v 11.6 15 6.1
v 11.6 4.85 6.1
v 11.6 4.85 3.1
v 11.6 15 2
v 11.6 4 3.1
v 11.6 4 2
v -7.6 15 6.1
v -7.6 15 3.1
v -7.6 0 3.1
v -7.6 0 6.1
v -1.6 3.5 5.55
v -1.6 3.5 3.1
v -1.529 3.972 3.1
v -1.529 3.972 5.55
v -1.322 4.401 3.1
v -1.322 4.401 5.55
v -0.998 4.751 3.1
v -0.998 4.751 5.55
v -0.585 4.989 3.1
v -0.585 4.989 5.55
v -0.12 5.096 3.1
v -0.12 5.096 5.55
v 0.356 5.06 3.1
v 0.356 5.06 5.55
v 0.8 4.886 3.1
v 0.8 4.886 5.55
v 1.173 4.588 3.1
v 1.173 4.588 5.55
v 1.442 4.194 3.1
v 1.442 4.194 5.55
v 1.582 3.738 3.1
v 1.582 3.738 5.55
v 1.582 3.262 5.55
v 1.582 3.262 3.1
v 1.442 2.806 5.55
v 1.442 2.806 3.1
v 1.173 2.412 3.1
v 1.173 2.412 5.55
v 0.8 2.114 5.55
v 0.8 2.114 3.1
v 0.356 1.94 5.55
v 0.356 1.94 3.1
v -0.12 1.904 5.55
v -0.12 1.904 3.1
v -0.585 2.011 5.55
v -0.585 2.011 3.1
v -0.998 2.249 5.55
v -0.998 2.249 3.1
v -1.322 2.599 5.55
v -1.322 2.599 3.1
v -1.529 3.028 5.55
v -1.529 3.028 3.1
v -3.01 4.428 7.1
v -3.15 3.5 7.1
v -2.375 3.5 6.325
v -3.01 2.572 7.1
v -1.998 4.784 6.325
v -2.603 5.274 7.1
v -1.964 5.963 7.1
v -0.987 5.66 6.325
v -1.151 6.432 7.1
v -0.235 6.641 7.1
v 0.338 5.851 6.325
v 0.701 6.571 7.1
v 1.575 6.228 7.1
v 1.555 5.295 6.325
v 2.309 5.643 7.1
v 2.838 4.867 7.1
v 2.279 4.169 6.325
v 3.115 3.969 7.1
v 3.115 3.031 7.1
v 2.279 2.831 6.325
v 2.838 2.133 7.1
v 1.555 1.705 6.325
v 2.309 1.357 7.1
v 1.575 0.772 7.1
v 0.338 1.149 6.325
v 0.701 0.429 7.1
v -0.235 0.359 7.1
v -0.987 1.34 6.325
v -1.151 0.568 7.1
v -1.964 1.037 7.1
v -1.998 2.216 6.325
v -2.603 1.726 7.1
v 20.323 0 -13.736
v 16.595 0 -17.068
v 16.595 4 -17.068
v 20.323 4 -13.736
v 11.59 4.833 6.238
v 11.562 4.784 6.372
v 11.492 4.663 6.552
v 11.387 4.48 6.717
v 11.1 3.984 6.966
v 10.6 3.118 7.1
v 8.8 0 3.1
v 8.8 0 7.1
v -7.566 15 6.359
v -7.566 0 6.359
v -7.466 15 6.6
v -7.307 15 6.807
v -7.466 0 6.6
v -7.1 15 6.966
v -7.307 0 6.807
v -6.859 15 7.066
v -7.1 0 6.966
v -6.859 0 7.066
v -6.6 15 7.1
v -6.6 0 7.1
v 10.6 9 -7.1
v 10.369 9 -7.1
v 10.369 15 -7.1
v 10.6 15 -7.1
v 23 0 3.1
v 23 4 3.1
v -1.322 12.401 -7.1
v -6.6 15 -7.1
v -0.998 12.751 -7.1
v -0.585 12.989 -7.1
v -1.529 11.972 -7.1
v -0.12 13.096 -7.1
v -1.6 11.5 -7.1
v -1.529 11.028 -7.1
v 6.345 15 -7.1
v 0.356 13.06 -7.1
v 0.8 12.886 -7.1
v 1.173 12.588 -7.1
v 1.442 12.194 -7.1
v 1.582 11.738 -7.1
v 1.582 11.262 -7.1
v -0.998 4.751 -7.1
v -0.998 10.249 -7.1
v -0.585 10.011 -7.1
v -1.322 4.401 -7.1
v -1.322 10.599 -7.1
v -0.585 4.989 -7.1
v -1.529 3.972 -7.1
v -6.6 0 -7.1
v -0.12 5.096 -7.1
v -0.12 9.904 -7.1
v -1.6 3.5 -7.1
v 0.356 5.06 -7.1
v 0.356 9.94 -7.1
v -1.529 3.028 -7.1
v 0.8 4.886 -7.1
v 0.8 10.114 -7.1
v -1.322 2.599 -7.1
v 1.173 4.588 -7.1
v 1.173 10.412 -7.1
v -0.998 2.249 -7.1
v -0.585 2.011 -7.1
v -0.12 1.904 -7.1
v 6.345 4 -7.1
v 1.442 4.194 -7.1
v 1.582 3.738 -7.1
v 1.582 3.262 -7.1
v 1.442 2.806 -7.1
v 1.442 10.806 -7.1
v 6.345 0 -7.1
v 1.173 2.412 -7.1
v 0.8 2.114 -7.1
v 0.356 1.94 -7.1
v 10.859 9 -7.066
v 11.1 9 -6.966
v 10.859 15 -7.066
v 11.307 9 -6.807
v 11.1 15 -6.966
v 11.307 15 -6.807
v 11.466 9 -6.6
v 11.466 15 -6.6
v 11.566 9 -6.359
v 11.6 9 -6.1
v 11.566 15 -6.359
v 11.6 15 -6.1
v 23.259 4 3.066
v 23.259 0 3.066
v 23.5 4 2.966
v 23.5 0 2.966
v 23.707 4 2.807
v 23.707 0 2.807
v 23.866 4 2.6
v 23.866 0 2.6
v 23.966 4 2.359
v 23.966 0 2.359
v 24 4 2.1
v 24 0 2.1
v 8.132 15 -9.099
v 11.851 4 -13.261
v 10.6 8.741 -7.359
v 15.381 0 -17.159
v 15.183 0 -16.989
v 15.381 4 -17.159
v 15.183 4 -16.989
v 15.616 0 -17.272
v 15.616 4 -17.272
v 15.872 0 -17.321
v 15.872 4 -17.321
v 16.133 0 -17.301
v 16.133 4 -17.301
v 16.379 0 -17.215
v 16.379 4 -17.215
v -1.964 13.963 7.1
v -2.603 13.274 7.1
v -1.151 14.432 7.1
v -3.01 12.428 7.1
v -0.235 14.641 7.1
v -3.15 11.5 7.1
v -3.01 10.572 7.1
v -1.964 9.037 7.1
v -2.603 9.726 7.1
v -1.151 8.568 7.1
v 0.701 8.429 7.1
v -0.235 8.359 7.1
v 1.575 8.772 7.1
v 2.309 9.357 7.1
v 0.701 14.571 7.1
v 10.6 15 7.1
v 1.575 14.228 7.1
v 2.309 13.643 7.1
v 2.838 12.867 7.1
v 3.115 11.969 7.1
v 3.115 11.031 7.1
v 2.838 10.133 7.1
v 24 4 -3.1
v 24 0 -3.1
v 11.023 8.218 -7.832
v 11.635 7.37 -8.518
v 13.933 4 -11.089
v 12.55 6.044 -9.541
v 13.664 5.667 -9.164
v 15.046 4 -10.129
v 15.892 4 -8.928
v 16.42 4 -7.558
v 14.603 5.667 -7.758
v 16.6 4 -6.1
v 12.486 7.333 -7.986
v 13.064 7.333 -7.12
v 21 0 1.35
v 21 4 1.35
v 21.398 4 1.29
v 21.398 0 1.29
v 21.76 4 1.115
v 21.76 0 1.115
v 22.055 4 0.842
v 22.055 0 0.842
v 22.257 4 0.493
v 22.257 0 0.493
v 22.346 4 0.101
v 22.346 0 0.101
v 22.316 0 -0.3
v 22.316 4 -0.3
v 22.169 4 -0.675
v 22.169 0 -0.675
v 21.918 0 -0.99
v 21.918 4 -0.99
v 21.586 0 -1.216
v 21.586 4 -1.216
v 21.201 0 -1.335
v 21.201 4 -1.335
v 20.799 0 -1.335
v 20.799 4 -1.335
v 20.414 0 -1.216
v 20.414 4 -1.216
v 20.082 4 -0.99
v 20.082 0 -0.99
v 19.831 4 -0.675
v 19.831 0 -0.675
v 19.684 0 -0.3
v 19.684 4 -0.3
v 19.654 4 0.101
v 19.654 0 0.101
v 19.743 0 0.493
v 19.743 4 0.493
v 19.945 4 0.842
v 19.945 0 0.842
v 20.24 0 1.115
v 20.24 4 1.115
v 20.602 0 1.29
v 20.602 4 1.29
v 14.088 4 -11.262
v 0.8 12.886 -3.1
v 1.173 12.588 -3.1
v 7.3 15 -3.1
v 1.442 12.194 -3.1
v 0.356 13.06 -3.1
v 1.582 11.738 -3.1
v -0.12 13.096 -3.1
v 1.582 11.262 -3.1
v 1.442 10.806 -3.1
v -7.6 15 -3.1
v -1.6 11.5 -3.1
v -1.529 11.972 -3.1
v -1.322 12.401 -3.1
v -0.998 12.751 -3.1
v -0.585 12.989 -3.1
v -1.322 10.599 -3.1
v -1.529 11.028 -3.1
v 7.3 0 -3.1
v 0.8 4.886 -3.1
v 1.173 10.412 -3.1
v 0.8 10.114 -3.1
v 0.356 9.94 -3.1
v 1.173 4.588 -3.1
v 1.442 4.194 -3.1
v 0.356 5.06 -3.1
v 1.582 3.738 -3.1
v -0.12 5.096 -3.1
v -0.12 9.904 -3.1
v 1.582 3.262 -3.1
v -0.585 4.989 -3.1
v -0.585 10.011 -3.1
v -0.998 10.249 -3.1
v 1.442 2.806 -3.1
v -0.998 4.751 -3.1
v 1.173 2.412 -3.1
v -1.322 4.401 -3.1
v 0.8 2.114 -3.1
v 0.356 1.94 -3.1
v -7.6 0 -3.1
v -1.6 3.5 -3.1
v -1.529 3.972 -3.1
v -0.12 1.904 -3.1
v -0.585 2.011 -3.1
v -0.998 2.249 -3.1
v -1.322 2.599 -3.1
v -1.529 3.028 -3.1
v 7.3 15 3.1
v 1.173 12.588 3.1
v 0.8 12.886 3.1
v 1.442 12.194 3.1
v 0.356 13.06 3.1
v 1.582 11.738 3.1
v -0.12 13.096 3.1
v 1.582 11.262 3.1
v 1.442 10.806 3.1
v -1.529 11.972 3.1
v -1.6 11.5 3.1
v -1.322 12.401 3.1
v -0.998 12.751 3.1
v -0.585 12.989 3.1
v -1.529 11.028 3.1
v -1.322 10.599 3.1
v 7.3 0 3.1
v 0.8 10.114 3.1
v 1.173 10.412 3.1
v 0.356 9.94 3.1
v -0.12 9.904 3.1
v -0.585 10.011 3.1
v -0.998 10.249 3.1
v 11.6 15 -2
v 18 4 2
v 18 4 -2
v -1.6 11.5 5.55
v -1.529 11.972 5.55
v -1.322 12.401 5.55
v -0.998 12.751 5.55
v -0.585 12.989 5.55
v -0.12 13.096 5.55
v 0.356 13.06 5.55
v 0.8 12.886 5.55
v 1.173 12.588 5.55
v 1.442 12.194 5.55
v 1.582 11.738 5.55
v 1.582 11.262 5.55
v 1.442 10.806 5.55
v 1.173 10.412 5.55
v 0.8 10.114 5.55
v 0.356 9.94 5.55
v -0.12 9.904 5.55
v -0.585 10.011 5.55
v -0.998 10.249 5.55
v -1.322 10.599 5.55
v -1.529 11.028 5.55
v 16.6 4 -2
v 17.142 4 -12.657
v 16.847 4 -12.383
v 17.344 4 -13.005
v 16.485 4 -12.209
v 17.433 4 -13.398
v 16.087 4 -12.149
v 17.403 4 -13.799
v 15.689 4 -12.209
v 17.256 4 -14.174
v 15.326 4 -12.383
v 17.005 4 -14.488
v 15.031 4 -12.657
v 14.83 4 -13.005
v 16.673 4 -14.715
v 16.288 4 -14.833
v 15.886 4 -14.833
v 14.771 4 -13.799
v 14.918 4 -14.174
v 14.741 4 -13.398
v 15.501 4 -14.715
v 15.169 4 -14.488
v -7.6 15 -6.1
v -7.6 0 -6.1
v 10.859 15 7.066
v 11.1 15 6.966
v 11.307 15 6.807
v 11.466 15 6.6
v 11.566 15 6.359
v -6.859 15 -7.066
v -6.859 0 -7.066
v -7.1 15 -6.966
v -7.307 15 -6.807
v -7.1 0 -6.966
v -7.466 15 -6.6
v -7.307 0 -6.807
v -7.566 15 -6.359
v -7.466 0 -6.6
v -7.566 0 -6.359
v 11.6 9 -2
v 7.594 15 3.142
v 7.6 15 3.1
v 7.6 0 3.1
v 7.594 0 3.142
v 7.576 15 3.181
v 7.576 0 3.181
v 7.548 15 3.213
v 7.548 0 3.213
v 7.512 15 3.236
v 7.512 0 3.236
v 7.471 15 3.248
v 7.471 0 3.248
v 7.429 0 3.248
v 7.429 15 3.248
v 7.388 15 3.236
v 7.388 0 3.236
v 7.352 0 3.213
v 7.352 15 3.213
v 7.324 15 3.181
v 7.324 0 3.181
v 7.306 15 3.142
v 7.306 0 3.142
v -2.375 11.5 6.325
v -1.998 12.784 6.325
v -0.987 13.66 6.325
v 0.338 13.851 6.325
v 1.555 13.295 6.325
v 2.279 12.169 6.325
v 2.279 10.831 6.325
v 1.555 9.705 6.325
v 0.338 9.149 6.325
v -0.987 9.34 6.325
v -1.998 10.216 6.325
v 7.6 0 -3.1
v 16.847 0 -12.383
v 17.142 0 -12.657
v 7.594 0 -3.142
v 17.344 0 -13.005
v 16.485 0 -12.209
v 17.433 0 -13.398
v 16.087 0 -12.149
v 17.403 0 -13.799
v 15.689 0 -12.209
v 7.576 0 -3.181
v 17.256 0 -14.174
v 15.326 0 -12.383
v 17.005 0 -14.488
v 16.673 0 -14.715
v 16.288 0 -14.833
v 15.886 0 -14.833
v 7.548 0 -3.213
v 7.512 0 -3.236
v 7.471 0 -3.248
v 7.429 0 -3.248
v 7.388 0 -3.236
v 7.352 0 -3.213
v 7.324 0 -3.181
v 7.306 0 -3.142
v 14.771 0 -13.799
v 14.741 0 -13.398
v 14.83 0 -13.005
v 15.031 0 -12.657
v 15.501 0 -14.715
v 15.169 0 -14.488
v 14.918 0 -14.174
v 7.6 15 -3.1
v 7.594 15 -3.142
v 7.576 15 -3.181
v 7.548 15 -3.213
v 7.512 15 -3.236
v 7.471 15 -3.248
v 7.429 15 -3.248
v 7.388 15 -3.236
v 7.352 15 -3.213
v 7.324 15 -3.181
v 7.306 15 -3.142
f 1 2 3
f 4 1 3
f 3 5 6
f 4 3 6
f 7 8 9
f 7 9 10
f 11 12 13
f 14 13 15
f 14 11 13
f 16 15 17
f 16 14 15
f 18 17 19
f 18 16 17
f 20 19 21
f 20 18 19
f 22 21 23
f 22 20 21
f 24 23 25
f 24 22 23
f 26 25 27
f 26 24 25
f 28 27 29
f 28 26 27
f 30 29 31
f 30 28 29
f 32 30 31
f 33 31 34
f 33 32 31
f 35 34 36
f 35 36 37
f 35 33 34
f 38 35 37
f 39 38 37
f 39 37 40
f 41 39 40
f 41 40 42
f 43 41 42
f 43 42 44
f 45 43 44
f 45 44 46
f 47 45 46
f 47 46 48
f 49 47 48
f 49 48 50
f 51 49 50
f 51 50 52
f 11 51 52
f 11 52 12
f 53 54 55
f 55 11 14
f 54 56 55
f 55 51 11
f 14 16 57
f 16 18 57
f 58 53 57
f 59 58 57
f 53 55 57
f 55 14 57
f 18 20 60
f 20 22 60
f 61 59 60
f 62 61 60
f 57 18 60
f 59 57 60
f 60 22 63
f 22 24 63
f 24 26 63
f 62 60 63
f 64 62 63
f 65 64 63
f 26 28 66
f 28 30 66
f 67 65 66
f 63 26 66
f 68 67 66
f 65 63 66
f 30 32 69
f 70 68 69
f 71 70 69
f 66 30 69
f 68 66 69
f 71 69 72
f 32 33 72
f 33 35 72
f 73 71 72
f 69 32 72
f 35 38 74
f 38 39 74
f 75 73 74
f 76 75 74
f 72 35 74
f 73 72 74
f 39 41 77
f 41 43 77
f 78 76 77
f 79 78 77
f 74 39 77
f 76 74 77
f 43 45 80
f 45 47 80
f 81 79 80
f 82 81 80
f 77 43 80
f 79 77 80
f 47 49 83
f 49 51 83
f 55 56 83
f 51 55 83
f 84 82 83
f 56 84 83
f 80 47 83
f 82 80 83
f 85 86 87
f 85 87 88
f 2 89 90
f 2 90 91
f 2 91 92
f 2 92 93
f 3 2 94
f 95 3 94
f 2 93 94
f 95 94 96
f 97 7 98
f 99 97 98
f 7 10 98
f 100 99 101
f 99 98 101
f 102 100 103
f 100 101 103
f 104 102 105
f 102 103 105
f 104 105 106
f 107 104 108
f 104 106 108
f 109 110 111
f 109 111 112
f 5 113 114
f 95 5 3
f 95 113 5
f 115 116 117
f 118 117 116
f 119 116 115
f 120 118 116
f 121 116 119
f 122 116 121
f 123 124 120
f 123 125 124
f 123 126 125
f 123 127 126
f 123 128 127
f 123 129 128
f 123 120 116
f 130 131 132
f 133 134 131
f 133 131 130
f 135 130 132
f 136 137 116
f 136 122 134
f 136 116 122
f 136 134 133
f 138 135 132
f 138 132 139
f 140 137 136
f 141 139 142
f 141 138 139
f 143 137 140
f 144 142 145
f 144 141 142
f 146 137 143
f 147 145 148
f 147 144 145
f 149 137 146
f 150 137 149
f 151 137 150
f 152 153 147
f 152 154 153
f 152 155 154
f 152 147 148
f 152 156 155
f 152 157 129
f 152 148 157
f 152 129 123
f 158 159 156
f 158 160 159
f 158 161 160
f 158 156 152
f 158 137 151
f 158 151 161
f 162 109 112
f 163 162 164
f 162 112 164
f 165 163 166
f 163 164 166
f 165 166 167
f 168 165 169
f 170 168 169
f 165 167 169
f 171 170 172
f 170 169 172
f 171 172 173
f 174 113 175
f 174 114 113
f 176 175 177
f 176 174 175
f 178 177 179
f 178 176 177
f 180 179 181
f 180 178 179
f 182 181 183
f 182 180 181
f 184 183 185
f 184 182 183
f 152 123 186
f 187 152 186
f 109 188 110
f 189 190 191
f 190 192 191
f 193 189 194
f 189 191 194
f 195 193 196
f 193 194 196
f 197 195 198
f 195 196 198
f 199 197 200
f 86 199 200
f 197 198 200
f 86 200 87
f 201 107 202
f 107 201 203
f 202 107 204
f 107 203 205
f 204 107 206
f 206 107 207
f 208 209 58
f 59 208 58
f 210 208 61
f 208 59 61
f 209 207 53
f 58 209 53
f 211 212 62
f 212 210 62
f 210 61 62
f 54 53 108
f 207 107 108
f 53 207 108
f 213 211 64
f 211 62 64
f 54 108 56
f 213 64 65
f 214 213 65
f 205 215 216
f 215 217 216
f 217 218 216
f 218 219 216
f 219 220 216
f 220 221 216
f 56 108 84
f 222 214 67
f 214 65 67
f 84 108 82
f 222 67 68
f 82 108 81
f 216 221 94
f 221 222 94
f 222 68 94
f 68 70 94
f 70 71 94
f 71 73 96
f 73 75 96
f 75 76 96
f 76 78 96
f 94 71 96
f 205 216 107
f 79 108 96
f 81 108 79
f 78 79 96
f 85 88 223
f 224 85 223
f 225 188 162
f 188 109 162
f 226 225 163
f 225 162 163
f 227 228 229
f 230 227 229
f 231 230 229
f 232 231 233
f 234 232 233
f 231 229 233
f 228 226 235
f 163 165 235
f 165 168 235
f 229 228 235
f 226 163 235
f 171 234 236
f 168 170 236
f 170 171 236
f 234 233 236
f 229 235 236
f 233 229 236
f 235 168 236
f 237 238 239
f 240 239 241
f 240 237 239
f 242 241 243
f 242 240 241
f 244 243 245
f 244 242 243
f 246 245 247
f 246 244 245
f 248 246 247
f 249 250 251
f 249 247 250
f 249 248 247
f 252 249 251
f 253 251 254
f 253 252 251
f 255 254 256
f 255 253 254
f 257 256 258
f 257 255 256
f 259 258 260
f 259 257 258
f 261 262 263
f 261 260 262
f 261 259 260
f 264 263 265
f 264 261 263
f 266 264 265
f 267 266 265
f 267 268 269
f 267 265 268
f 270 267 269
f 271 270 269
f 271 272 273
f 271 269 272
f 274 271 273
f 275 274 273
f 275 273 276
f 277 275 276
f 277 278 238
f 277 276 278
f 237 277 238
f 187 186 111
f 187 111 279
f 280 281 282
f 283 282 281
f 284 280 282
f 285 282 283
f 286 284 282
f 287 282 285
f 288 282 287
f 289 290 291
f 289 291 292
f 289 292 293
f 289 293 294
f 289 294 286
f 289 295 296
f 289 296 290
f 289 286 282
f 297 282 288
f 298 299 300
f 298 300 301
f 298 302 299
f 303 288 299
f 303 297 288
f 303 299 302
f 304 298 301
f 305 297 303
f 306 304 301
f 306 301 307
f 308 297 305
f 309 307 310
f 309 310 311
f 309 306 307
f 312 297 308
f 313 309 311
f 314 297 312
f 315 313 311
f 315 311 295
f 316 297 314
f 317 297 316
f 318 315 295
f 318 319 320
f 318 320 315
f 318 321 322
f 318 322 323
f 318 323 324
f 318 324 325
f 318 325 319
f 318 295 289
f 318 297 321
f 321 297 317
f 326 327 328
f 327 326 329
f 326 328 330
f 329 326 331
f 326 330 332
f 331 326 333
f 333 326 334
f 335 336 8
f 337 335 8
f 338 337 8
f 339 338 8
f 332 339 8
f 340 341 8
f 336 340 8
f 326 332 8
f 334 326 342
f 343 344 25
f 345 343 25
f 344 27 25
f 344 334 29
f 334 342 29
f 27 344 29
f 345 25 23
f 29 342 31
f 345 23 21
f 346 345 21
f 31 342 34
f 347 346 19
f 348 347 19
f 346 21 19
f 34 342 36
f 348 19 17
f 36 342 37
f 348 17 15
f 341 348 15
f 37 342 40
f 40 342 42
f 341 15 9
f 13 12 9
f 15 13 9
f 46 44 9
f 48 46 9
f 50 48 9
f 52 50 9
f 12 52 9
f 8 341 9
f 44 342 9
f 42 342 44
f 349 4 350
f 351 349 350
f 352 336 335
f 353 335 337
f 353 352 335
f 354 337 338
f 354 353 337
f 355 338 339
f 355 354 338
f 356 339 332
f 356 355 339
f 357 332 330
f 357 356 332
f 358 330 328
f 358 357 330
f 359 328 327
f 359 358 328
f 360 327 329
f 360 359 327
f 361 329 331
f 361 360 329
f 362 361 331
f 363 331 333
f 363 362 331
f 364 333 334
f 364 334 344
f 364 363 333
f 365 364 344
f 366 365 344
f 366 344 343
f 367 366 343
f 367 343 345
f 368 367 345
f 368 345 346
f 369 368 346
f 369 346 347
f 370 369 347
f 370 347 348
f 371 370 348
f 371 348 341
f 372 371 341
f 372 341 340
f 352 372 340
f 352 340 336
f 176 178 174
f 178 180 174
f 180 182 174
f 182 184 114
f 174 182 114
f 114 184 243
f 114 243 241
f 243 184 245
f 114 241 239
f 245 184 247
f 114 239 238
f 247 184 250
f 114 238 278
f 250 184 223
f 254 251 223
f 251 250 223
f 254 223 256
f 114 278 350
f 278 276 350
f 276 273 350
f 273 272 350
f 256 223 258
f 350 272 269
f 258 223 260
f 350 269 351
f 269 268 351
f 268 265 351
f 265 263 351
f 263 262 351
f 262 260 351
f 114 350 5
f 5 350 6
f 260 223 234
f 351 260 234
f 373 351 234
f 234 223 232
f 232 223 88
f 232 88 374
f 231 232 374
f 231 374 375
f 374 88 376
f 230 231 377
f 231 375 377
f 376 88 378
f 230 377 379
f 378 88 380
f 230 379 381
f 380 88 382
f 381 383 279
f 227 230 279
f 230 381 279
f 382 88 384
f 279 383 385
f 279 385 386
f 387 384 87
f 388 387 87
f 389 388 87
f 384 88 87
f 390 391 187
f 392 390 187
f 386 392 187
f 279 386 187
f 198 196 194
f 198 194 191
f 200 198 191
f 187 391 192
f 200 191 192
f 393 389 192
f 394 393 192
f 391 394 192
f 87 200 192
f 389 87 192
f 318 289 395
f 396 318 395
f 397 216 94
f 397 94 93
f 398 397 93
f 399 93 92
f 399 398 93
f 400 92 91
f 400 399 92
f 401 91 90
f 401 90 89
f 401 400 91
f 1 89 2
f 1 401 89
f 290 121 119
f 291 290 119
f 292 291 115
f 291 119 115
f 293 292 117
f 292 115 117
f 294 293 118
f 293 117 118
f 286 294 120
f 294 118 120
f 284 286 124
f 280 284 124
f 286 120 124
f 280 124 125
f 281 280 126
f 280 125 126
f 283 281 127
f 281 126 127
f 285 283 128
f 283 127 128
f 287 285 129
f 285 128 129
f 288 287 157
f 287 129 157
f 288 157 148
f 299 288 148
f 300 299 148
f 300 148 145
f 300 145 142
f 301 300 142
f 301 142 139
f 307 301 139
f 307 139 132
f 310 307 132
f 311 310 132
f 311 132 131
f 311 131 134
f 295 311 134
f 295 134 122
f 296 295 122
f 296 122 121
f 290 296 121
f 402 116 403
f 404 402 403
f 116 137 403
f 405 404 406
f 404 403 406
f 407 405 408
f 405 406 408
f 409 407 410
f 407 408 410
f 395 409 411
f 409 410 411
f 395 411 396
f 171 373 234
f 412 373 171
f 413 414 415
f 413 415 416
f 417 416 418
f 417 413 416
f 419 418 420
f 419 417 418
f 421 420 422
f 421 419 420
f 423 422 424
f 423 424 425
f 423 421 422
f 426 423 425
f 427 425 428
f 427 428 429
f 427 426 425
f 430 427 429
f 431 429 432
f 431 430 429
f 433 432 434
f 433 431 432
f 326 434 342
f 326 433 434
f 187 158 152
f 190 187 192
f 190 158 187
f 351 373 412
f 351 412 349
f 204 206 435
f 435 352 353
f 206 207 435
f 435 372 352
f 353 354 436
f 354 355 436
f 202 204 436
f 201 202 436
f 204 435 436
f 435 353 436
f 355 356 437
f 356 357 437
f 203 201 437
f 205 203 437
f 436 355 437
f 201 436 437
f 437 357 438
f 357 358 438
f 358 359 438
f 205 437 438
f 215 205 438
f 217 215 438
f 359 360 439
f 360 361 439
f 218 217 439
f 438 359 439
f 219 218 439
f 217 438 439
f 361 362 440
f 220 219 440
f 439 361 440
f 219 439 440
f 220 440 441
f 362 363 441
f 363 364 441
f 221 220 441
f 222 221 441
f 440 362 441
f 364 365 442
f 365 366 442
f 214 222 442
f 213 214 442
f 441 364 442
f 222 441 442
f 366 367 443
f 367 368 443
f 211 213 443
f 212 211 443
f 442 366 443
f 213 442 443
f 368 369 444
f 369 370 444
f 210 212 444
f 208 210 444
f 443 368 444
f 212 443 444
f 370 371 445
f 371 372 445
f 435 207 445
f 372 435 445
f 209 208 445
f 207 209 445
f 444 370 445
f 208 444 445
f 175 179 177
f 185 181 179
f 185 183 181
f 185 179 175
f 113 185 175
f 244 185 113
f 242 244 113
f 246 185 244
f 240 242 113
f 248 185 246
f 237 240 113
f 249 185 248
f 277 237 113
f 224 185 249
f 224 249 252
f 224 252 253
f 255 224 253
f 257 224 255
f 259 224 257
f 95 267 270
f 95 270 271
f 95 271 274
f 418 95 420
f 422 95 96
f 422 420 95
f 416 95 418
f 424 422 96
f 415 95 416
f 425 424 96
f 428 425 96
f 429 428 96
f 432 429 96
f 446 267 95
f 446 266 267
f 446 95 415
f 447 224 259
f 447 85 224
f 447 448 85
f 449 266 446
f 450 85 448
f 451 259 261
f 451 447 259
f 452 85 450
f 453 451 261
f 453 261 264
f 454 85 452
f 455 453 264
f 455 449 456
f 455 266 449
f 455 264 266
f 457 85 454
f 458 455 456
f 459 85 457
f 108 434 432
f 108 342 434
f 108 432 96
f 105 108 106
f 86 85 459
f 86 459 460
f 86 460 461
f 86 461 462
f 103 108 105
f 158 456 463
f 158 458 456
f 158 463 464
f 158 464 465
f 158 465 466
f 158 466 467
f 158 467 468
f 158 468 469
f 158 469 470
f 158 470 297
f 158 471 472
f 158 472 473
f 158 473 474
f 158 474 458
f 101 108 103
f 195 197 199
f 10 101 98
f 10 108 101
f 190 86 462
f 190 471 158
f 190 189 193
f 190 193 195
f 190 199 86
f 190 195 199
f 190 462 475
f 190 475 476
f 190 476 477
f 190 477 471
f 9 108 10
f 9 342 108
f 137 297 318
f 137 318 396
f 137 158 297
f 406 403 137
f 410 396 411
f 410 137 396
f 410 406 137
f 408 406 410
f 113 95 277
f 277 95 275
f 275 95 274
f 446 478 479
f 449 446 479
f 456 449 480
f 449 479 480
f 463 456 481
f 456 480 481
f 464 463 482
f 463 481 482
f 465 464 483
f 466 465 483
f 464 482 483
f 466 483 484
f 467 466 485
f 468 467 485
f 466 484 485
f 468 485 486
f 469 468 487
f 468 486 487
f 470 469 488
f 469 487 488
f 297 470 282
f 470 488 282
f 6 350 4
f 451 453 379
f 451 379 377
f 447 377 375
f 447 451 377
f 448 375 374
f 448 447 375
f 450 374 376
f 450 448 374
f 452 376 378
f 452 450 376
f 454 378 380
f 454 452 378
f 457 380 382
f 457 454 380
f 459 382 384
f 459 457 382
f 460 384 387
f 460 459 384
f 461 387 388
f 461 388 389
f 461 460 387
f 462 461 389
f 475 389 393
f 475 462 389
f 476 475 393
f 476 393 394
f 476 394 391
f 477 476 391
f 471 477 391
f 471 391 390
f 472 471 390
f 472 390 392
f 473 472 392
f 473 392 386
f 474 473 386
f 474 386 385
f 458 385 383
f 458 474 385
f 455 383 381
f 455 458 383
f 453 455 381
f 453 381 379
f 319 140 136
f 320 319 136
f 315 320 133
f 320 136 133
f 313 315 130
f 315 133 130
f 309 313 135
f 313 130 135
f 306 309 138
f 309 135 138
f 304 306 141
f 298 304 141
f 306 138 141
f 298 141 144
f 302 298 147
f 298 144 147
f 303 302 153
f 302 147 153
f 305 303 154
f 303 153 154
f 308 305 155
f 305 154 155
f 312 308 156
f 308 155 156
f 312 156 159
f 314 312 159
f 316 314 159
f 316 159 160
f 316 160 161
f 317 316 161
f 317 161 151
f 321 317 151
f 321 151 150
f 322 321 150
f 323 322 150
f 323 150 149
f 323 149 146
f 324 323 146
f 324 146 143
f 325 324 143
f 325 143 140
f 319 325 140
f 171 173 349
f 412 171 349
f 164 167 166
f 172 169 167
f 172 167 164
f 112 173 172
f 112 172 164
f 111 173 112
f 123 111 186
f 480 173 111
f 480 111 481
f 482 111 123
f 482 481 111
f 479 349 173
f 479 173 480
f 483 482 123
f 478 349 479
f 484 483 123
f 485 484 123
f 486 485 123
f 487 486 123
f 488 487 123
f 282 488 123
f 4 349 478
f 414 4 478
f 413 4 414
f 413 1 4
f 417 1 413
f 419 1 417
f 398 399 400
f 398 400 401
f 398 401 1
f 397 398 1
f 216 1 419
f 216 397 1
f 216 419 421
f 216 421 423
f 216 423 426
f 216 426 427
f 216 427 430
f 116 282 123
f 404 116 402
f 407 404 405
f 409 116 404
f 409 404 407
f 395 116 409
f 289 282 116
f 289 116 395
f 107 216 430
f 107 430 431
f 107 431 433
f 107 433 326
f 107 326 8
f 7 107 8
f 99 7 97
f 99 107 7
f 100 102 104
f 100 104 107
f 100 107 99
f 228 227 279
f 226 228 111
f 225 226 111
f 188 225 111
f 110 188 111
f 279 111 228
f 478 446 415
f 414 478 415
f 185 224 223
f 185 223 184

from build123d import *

# Parameters (mm, degrees)
SKETCH_1_R                   = 1.35
EXTRUDE_1_DEPTH              = 4
EXTRUDE_2_DEPTH              = 11
CUT_EXTRUDE_1_DEPTH          = 10
CUT_EXTRUDE_2_DEPTH          = 3
SKETCH_6_R                   = 1.6
CUT_EXTRUDE_3_DEPTH          = 31.233967875
SKETCH_7_R                   = 0.15
CUT_EXTRUDE_4_DEPTH          = 34.399294341
CUT_EXTRUDE_5_DEPTH          = 34.399294341
CUT_EXTRUDE_6_DEPTH          = 34.399294341
HOLE_WIZARD_M3_3_D           = 3.2
HOLE_WIZARD_M3_3_CSINK_D     = 6.3
HOLE_WIZARD_M3_3_CSINK_ANGLE = 90
EXTRUDE_3_DEPTH              = 4
FILLET_1_R                   = 1
CHAMFER_1_SIZE               = 5
CUT_EXTRUDE_7_DEPTH          = 4


with BuildPart() as part:
    # 草图1 → 凸台-拉伸1 (new body)
    with BuildSketch(Plane(origin=(0, 0, 0), x_dir=(1, 0, 0), z_dir=(0, 1, 0))):
        Polygon((7.6, -3.1), (7.6, 3.1), (-7.6, 3.1), (-7.6, -3.1), (-24, -3.1), (-24, 3.1), (-11.6, 3.1), (-11.6, 3.975781599), (-20.322903997, 13.736347087), (-15.849126022, 17.734510495), (-6.345187525, 7.1), (6.345187525, 7.1), (15.849126022, 17.734510495), (20.322903997, 13.736347087), (11.6, 3.975781599), (11.6, 3.1), (24, 3.1), (24, -3.1), align=None)
        with Locations(Location((-21, 0, 0), (0, 0, 270))):
            Circle(SKETCH_1_R, mode=Mode.SUBTRACT)
        with Locations(Location((-16.086933305, 13.498539803, 0), (0, 0, 270))):
            Circle(SKETCH_1_R, mode=Mode.SUBTRACT)
        with Locations(Location((16.086933305, 13.498539803, 0), (0, 0, 270))):
            Circle(SKETCH_1_R, mode=Mode.SUBTRACT)
        with Locations(Location((21, 0, 0), (0, 0, 270))):
            Circle(SKETCH_1_R, mode=Mode.SUBTRACT)
    extrude(amount=EXTRUDE_1_DEPTH)

    # 草图3 → 凸台-拉伸2 (add)
    with BuildSketch(Plane(origin=(0, 4, 0), x_dir=(1, 0, 0), z_dir=(0, 1, 0))):
        Polygon((-6.345187525, 7.1), (6.345187525, 7.1), (11.850962614, 13.26073252), (14.087851602, 11.261650816), (10.36863261, 7.1), (11.6, 7.1), (11.6, 2), (18, 2), (18, -2), (7.6, -2), (7.6, 3.1), (-7.6, 3.1), (-7.6, -3.1), (-18, -3.1), (-18, -0.1), (-11.6, -0.1), (-11.6, 7.1), (-10.36863261, 7.1), (-14.087851602, 11.261650816), (-11.850962614, 13.26073252), align=None)
    extrude(amount=EXTRUDE_2_DEPTH)

    # 草图4 → 切除-拉伸1 (cut)
    with BuildSketch(Plane.XY.offset(3.1)):
        Polygon((-11.6, 15), (-18, 4), (-18, 15), align=None)
        Polygon((18, 4), (18, 15), (11.6, 15), align=None)
    extrude(amount=-CUT_EXTRUDE_1_DEPTH, mode=Mode.SUBTRACT)

    # 草图5 → 切除-拉伸2 (cut)
    with BuildSketch(Plane(origin=(0, 0, 0), x_dir=(-0.6663605679521429, 0, 0.745629662418615), z_dir=(-0.745629662418615, 0, -0.6663605679521429))):
        Polygon((-12.203218518, 15), (-17.784609691, 4), (-17.784609691, 15), align=None)
    cut_extrude_2 = extrude(amount=-CUT_EXTRUDE_2_DEPTH, mode=Mode.SUBTRACT)

    # 镜向2: 切除-拉伸2 across plane
    add(cut_extrude_2.mirror(Plane(origin=(0, 0, 0), x_dir=(0, 0, 1), z_dir=(1, 0, 0))), mode=Mode.SUBTRACT)

    # 草图6 → 切除-拉伸3 (cut, through all)
    with BuildSketch(Plane(origin=(0, 0, -7.1), x_dir=(-1, 0, 0), z_dir=(0, 0, -1))):
        with Locations((0, 11.5)):
            Circle(SKETCH_6_R)
        with Locations((0, 3.5)):
            Circle(SKETCH_6_R)
    extrude(amount=-CUT_EXTRUDE_3_DEPTH, mode=Mode.SUBTRACT)

    # 草图7 → 切除-拉伸4 (cut, through all)
    with BuildSketch(Plane(origin=(0, 15, 0), x_dir=(1, 0, 0), z_dir=(0, 1, 0))):
        with Locations((7.45, 3.1)):
            Circle(SKETCH_7_R)
    extrude(amount=-CUT_EXTRUDE_4_DEPTH, mode=Mode.SUBTRACT)

    # 草图8 → 切除-拉伸5 (cut, through all)
    with BuildSketch(Plane(origin=(0, 15, 0), x_dir=(1, 0, 0), z_dir=(0, 1, 0))):
        Polygon((-7.6, 24.734510495), (-31, 24.734510495), (-31, -10.1), (-7.6, -10.1), (-7.6, 3.1), (-7.6, 7.1), (-2.6, 7.1), (-2.6, 24.734510495), align=None)
    extrude(amount=-CUT_EXTRUDE_5_DEPTH, mode=Mode.SUBTRACT)

    # 镜向3: part across plane


with BuildPart() as part_1:
    add(part.part)
    add(part.part.mirror(Plane.XY))

    # 草图9 → 切除-拉伸6 (cut, through all)
    with BuildSketch(Plane(origin=(0, 15, 0), x_dir=(1, 0, 0), z_dir=(0, 1, 0))):
        Polygon((6.345187525, -7.1), (11.6, -7.1), (11.6, -3.975781599), (21.345187525, -3.975781599), (21.345187525, -18.975781599), (6.345187525, -18.975781599), align=None)
    extrude(amount=-CUT_EXTRUDE_6_DEPTH, mode=Mode.SUBTRACT)

    # M3 锥坑高头螺钉的锥形沉头孔3 (through all)
    with Locations(Plane(origin=(0, 11.5, 7.1), x_dir=(1, 0, 0), z_dir=(0, 0, 1))):
        with Locations((0, 0), (0, -8)):
            CounterSinkHole(HOLE_WIZARD_M3_3_D / 2, HOLE_WIZARD_M3_3_CSINK_D / 2, counter_sink_angle=HOLE_WIZARD_M3_3_CSINK_ANGLE)

    # 草图12 → 凸台-拉伸3 (add)
    with BuildSketch(Plane(origin=(0, 4, 0), x_dir=(1, 0, 0), z_dir=(0, 1, 0))):
        Polygon((11.6, 3.975781599), (20.322903997, 13.736347087), (24, 3.1), (11.6, 3.1), align=None)
    extrude(amount=-EXTRUDE_3_DEPTH)

    # 圆角1
    fillet_1_edges = [part_1.edges().sort_by_distance(p)[0] for p in [
        (-7.6, 7.5, -7.1),
        (11.6, 7.5, 7.1),
        (-7.6, 7.5, 7.1),
        (15.849126022, 2, -17.734510495),
        (24, 2, 3.1),
        (11.6, 9.5, -7.1),
    ]]
    fillet(fillet_1_edges, radius=FILLET_1_R)

    # 倒角1
    # the kernel refuses this chamfer: 5 mm, written as the material it adds along each edge
    with BuildSketch(Plane(origin=(-2.48978233, 4, -7.1), x_dir=(0, -0.02749587661058641, -0.9996219169112968), z_dir=(1, 0, 0))) as chamfer_1_piece_1_section:
        Polygon((CHAMFER_1_SIZE * 0.999621916911, CHAMFER_1_SIZE * 0.0274958766106), (-CHAMFER_1_SIZE * 0.0274958766106, CHAMFER_1_SIZE * 0.999621916911), (0, 0), align=None)
    chamfer_1_piece_1 = extrude(amount=13.08978233, mode=Mode.PRIVATE)
    chamfer_1_piece_1 = split(chamfer_1_piece_1, bisect_by=Plane(origin=(10.479473381, 6.457230488, -7.224026197), z_dir=(0.7456296624186146, 0, 0.6663605679521433)), keep=Keep.TOP, mode=Mode.PRIVATE)
    add(chamfer_1_piece_1)
    with BuildSketch(Plane(origin=(10.6, 4, -6.1), x_dir=(0, 0, -1), z_dir=(-1, 0, 0))) as chamfer_1_piece_2_section:
        Polygon((1 + CHAMFER_1_SIZE, 0), (1, -CHAMFER_1_SIZE), (1, 0), align=None)
    chamfer_1_piece_2 = revolve(axis=Axis((10.6, 4, -6.1), (0, -1, 0)), revolution_arc=90, mode=Mode.PRIVATE)
    chamfer_1_piece_2 = split(chamfer_1_piece_2, bisect_by=Plane(origin=(10.960493571, 6.207373744, -7.762267712), z_dir=(0.7456296624186146, 0, 0.6663605679521433)), keep=Keep.TOP, mode=Mode.PRIVATE)
    add(chamfer_1_piece_2)
    with BuildSketch(Plane(origin=(11.6, 4, -2), x_dir=(0.9996219169112968, -0.027495876610586396, 0), z_dir=(0, 0, -1))) as chamfer_1_piece_3:
        Polygon((CHAMFER_1_SIZE * 0.999621916911, -CHAMFER_1_SIZE * 0.0274958766106), (-CHAMFER_1_SIZE * 0.0274958766106, -CHAMFER_1_SIZE * 0.999621916911), (0, 0), align=None)
    extrude(amount=4.1)

    # 草图13 → 切除-拉伸7 (cut)
    with BuildSketch(Plane.XY.offset(7.1)):
        Polygon((11.6, 4.849742261), (8.8, 0), (11.6, 0), align=None)
    extrude(amount=-CUT_EXTRUDE_7_DEPTH, mode=Mode.SUBTRACT)


solid = part_1.part
